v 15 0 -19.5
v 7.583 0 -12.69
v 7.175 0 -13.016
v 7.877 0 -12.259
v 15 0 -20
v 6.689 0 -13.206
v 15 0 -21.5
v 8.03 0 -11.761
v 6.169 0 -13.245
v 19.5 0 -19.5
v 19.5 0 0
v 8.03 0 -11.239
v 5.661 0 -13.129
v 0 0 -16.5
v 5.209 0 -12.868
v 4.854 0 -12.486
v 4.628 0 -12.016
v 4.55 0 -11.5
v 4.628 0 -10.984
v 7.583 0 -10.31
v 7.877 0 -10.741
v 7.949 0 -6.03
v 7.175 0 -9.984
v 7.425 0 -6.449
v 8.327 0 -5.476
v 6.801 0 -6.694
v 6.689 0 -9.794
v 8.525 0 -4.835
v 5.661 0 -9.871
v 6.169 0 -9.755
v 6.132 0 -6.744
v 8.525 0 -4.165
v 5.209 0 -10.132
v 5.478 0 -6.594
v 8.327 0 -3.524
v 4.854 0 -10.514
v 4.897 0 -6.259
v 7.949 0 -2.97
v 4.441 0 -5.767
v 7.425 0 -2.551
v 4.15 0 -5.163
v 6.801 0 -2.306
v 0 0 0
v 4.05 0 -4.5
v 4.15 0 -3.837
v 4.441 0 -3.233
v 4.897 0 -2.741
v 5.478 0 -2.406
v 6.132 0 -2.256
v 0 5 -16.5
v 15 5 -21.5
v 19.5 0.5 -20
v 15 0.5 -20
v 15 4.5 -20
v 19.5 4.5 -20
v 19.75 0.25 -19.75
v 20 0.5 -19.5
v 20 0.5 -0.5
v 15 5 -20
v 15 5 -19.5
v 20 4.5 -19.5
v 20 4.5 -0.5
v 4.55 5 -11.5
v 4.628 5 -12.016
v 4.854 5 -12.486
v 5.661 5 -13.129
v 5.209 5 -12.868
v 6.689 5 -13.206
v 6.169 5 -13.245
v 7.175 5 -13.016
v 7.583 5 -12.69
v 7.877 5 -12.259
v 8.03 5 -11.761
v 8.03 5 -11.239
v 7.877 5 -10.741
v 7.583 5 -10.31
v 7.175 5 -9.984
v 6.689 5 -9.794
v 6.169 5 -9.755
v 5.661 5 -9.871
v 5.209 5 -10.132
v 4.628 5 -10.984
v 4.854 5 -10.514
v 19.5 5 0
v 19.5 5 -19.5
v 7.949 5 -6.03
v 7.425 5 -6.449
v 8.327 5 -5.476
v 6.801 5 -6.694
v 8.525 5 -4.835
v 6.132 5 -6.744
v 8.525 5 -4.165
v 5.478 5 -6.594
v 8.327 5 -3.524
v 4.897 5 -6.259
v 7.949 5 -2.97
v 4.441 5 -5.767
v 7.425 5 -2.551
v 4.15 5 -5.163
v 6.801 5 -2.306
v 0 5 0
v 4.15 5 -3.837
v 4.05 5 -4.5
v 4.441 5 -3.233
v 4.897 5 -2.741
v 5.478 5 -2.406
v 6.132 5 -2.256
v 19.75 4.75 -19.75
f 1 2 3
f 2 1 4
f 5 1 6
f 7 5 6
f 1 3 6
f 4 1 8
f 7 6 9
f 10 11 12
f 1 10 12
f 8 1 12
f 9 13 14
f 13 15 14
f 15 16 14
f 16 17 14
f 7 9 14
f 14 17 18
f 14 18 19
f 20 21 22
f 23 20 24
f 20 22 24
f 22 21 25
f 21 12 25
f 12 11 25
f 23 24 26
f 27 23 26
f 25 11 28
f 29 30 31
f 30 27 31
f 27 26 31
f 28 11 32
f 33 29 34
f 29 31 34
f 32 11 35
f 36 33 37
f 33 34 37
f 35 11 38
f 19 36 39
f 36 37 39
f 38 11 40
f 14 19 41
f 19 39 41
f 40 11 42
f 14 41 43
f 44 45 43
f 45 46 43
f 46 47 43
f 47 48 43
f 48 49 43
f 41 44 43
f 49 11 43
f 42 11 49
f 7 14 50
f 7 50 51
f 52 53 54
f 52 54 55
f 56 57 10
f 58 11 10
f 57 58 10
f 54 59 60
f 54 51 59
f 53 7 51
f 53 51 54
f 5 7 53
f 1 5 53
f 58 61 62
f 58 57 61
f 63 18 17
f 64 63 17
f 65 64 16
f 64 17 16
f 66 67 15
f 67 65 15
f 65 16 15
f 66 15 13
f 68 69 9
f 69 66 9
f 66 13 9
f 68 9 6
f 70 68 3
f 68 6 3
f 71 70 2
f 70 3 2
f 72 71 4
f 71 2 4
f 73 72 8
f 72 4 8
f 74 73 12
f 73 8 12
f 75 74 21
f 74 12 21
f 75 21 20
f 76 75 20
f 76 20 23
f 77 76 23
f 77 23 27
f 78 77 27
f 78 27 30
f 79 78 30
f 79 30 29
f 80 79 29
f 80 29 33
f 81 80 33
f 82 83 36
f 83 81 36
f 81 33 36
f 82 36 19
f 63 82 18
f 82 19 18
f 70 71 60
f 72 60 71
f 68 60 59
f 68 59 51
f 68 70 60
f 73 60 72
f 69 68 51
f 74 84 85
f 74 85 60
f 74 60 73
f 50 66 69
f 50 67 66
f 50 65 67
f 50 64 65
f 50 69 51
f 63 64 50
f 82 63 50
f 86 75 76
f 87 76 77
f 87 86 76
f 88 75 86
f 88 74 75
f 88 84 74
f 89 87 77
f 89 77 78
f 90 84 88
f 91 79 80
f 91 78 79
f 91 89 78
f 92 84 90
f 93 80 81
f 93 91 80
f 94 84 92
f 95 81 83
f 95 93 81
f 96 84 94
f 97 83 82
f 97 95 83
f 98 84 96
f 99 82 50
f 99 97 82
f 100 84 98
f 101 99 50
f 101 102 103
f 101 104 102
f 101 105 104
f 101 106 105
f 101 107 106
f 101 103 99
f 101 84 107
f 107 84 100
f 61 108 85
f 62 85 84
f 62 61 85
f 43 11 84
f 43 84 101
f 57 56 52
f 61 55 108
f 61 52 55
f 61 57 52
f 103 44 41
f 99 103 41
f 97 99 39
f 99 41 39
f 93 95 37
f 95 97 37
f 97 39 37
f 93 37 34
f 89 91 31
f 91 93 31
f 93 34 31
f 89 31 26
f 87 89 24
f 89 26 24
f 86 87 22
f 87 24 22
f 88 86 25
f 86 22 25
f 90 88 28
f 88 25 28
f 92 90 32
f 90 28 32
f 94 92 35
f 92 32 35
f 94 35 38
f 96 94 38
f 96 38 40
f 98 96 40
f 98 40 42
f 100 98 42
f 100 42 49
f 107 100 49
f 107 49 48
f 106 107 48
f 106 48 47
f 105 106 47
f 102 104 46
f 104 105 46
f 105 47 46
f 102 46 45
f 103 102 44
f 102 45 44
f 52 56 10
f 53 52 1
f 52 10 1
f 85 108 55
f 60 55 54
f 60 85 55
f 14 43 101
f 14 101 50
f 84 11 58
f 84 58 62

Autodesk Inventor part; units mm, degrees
ref_plane "YZ Plane" through (0, 0, 0) normal (1, 0, 0) x (0, 1, 0)
ref_plane "XZ Plane" through (0, 0, 0) normal (0, 1, 0) x (-1, 0, 0)
ref_plane "XY Plane" through (0, 0, 0) normal (0, 0, 1) x (1, 0, 0)
sketch "Sketch1" plane through (0, 0, 0) normal (0, 1, 0) x (-1, 0, 0)
  line L0 (0, 0) -> (0, -16.5)
  line L1 (0, -16.5) -> (-15, -21.5)
  line L2 (-15, -21.5) -> (-15, -20)
  line L3 (-15, -20) -> (-20, -20)
  line L4 (-20, -20) -> (-20, 0)
  line L5 (-20, 0) -> (0, 0)
  circle A0 centre (-6.3, -4.5) radius 2.25
  circle A1 centre (-6.3, -11.5) radius 1.75
  point P0 (-15, -20.75)
  dimension "d0" = 16.5
  dimension "d1" = 20
  dimension "d2" = 20
  dimension "d3" = 21.5
  dimension "d4" = 5
  dimension "d5" = 4.5
  dimension "d6" = 11.5
  dimension "d7" = 4.5
  dimension "d8" = 3.5
  dimension "d9" = 13.7
  dimension "d10" = 13.7
extrude "Extrusion1" add sketch "Sketch1" along normal blind 5
chamfer "Chamfer1" distance 0.5 angle 45 2 edges at (17.5, 0, -20) (20, 0, -10) measured on face at (15.9997, 0, -10.3604)
chamfer "Chamfer2" distance 0.5 angle 45 2 edges at (17.5, 5, -20) (20, 5, -10) measured on face at (15.9997, 5, -10.3604)
chamfer "Chamfer3" distance 0.5 angle 45 2 edges at (20, 2.5, -20) (20, 2.5, 0) measured on face at (20, 3.1667, -13.3333)
properties part number "21-30-220-B3"
